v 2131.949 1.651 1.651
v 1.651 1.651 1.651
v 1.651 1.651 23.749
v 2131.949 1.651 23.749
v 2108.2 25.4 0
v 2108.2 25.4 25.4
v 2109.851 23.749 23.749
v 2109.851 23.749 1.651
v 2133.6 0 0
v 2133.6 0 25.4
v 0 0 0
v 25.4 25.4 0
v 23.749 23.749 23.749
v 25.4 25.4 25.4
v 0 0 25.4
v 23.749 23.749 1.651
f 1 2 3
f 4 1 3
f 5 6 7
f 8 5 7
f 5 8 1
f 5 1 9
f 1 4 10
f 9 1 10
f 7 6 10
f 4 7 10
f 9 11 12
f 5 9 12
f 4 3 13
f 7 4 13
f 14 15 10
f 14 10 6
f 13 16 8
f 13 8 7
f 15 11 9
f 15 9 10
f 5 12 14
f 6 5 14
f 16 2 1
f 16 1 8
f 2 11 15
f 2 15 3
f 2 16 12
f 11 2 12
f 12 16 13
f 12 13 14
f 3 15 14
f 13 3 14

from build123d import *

# Parameters (mm, degrees)
F0_W     = 25.4
F0_H     = 25.4
F0_W_2   = 22.098
F0_H_2   = 22.098
F1_DEPTH = 2133.6
F3_DEPTH = 25.401
F5_DEPTH = 25.401


with BuildPart() as f1:
    # F0 (on Right) → F1 (new body)
    with BuildSketch(Plane.YZ):
        with Locations((12.7, 12.7)):
            Rectangle(F0_W, F0_H)
        with Locations((12.7, 12.7)):
            Rectangle(F0_W_2, F0_H_2, mode=Mode.SUBTRACT)
    extrude(amount=F1_DEPTH)

    # F2 (on face) → F3 (cut, through all)
    with BuildSketch(Plane.XY.offset(25.4)):
        Polygon((2108.2, 25.4), (2133.6, 0), (2133.6, 25.4), align=None)
    extrude(amount=-F3_DEPTH, mode=Mode.SUBTRACT)

    # F4 (on face) → F5 (cut, through all)
    with BuildSketch(Plane.XY.offset(25.4)):
        Polygon((0, 25.4), (0, 0), (25.4, 25.4), align=None)
    extrude(amount=-F5_DEPTH, mode=Mode.SUBTRACT)


solid = f1.part
